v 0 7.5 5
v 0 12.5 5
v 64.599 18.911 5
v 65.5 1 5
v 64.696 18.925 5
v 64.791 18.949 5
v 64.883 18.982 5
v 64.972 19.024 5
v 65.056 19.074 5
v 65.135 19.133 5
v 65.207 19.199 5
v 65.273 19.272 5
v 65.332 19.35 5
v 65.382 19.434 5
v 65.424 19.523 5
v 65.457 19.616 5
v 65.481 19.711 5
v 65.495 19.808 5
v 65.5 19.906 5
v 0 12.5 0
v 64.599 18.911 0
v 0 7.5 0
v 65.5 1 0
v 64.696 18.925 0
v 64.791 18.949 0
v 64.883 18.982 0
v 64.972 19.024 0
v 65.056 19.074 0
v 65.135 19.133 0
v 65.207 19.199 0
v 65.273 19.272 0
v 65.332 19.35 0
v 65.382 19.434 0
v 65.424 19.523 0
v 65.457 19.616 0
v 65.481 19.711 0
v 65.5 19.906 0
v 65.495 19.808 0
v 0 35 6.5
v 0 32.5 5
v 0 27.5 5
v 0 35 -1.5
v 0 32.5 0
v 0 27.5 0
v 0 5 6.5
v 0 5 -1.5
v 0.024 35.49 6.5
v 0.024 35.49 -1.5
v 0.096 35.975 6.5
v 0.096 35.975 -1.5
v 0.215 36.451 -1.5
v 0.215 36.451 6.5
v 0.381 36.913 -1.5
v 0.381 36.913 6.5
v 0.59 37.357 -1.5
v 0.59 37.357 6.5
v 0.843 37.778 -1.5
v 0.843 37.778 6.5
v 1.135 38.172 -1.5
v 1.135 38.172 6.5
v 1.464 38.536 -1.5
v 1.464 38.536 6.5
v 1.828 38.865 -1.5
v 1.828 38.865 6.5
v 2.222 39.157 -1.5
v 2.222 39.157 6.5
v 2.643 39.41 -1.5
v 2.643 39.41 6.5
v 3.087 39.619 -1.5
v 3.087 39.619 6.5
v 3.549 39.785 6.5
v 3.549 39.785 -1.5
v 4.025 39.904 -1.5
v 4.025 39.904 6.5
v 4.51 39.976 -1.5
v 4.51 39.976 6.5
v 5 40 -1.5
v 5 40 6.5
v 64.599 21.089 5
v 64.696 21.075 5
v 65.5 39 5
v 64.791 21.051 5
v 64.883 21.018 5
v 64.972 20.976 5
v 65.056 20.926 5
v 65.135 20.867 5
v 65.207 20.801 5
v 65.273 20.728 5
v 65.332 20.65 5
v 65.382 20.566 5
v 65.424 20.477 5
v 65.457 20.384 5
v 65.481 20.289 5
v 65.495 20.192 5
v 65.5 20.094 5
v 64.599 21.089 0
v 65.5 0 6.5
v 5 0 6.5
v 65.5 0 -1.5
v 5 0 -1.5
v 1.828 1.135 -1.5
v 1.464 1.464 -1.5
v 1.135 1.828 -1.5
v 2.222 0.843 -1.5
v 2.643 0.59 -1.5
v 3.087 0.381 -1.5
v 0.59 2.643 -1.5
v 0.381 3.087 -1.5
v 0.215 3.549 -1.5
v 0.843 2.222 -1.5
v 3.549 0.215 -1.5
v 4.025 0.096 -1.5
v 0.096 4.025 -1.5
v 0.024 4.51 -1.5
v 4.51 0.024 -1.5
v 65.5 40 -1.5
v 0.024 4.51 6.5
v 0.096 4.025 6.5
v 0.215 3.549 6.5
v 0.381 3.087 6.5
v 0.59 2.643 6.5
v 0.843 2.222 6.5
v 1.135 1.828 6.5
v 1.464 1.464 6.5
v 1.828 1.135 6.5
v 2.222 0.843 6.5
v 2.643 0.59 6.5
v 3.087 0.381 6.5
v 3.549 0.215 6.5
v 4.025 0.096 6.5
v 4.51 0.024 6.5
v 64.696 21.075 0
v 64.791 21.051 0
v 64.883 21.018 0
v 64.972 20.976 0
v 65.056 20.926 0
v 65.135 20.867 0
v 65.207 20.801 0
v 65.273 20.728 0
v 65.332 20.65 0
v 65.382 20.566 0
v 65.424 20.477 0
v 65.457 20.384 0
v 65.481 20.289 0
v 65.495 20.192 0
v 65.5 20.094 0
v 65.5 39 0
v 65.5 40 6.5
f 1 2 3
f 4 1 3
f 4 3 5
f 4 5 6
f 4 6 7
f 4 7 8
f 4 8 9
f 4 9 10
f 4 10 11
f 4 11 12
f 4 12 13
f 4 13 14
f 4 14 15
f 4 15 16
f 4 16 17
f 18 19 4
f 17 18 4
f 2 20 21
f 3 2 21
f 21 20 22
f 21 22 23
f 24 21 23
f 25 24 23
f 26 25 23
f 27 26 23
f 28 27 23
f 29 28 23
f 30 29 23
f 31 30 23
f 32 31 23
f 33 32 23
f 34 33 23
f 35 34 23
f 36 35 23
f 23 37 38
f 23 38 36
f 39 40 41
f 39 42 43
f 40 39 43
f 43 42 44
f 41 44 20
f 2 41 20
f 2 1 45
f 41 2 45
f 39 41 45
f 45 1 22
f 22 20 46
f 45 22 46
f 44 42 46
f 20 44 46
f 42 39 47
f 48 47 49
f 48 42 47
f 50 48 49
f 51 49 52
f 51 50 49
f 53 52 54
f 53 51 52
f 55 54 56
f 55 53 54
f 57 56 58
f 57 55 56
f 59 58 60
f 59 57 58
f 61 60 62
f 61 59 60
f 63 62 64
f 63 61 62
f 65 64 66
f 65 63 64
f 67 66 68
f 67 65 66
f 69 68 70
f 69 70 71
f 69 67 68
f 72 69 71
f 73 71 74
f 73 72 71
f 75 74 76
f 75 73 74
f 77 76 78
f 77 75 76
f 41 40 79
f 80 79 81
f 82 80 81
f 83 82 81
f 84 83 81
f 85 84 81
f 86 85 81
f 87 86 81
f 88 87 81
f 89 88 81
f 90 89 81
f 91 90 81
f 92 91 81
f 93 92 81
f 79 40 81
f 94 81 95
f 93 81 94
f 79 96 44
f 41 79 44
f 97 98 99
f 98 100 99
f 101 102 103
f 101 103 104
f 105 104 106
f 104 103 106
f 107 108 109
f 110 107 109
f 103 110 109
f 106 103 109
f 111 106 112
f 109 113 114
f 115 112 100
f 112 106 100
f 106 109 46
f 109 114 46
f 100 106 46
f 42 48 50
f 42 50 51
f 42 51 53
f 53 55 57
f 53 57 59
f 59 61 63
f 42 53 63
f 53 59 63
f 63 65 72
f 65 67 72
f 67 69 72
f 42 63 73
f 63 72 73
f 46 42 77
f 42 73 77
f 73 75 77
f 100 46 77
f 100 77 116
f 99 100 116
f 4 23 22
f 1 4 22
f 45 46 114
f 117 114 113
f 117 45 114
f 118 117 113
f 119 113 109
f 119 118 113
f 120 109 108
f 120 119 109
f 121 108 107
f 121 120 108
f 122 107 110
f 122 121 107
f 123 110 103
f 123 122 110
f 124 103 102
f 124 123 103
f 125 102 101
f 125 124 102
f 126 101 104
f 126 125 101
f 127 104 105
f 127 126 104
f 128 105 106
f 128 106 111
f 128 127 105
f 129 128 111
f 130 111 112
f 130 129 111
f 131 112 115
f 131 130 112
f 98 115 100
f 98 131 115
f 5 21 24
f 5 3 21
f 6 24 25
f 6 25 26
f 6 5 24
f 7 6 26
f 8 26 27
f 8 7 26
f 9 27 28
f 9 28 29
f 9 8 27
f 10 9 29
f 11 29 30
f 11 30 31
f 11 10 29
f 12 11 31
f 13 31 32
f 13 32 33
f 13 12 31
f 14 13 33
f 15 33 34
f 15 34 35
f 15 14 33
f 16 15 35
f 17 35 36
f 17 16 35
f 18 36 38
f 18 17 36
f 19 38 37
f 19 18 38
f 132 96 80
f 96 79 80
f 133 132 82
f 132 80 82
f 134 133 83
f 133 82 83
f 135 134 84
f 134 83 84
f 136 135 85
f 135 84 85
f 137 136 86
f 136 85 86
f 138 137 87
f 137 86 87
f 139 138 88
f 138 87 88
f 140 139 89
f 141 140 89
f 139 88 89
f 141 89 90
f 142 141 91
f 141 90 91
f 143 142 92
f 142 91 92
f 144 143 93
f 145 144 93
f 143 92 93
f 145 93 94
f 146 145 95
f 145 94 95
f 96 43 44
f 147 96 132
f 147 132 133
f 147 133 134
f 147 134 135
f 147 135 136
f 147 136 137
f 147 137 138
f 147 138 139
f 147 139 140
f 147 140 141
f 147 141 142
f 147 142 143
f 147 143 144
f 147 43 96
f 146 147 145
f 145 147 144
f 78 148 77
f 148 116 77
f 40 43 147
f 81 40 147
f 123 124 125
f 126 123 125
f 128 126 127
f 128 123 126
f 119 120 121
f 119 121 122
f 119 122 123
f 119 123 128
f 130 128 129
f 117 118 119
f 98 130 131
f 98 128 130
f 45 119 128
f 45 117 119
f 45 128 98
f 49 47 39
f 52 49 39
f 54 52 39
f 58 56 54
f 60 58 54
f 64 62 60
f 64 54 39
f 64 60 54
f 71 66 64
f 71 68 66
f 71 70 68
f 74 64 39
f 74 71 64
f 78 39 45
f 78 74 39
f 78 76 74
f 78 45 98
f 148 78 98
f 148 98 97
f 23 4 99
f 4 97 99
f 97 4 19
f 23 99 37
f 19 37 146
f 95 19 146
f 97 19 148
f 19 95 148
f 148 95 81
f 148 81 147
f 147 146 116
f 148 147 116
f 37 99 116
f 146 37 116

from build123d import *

# Parameters (mm, degrees)
SKETCH1_W           = 65.5
SKETCH1_H           = 40
BOSS_EXTRUDE1_DEPTH = 1.5
BOSS_EXTRUDE2_DEPTH = 5
BOSS_EXTRUDE3_START = 5
SKETCH1_5_W         = 65.5
SKETCH1_5_H         = 40
BOSS_EXTRUDE3_DEPTH = 1.5
FILLET1_R           = 5
FILLET2_R           = 1


with BuildPart() as part:
    # Sketch1 → Boss-Extrude1 (new body)
    with BuildSketch(Plane.XY):
        with Locations((32.75, 20)):
            Rectangle(SKETCH1_W, SKETCH1_H)
    extrude(amount=-BOSS_EXTRUDE1_DEPTH)

    # Sketch1<3> → Boss-Extrude2 (add)
    with BuildSketch(Plane.XY):
        Polygon((0, 7.5), (0, 0), (65.5, 0), (65.5, 1), align=None)
        Polygon((0, 27.5), (0, 12.5), (65.5, 19), (65.5, 21), align=None)
        Polygon((0, 40), (0, 32.5), (65.5, 39), (65.5, 40), align=None)
    extrude(amount=BOSS_EXTRUDE2_DEPTH)

    # Sketch1<5> → Boss-Extrude3 (add)
    with BuildSketch(Plane.XY.offset(BOSS_EXTRUDE3_START)):
        with Locations((32.75, 20)):
            Rectangle(SKETCH1_5_W, SKETCH1_5_H)
    extrude(amount=BOSS_EXTRUDE3_DEPTH)

    # Fillet1
    fillet1_edges = [part.edges().sort_by_distance(p)[0] for p in [
        (0, 40, 2.5),
        (0, 0, 2.5),
    ]]
    fillet(fillet1_edges, radius=FILLET1_R)

    # Fillet2
    fillet2_edges = [part.edges().sort_by_distance(p)[0] for p in [
        (65.5, 21, 2.5),
        (65.5, 19, 2.5),
    ]]
    fillet(fillet2_edges, radius=FILLET2_R)


solid = part.part
